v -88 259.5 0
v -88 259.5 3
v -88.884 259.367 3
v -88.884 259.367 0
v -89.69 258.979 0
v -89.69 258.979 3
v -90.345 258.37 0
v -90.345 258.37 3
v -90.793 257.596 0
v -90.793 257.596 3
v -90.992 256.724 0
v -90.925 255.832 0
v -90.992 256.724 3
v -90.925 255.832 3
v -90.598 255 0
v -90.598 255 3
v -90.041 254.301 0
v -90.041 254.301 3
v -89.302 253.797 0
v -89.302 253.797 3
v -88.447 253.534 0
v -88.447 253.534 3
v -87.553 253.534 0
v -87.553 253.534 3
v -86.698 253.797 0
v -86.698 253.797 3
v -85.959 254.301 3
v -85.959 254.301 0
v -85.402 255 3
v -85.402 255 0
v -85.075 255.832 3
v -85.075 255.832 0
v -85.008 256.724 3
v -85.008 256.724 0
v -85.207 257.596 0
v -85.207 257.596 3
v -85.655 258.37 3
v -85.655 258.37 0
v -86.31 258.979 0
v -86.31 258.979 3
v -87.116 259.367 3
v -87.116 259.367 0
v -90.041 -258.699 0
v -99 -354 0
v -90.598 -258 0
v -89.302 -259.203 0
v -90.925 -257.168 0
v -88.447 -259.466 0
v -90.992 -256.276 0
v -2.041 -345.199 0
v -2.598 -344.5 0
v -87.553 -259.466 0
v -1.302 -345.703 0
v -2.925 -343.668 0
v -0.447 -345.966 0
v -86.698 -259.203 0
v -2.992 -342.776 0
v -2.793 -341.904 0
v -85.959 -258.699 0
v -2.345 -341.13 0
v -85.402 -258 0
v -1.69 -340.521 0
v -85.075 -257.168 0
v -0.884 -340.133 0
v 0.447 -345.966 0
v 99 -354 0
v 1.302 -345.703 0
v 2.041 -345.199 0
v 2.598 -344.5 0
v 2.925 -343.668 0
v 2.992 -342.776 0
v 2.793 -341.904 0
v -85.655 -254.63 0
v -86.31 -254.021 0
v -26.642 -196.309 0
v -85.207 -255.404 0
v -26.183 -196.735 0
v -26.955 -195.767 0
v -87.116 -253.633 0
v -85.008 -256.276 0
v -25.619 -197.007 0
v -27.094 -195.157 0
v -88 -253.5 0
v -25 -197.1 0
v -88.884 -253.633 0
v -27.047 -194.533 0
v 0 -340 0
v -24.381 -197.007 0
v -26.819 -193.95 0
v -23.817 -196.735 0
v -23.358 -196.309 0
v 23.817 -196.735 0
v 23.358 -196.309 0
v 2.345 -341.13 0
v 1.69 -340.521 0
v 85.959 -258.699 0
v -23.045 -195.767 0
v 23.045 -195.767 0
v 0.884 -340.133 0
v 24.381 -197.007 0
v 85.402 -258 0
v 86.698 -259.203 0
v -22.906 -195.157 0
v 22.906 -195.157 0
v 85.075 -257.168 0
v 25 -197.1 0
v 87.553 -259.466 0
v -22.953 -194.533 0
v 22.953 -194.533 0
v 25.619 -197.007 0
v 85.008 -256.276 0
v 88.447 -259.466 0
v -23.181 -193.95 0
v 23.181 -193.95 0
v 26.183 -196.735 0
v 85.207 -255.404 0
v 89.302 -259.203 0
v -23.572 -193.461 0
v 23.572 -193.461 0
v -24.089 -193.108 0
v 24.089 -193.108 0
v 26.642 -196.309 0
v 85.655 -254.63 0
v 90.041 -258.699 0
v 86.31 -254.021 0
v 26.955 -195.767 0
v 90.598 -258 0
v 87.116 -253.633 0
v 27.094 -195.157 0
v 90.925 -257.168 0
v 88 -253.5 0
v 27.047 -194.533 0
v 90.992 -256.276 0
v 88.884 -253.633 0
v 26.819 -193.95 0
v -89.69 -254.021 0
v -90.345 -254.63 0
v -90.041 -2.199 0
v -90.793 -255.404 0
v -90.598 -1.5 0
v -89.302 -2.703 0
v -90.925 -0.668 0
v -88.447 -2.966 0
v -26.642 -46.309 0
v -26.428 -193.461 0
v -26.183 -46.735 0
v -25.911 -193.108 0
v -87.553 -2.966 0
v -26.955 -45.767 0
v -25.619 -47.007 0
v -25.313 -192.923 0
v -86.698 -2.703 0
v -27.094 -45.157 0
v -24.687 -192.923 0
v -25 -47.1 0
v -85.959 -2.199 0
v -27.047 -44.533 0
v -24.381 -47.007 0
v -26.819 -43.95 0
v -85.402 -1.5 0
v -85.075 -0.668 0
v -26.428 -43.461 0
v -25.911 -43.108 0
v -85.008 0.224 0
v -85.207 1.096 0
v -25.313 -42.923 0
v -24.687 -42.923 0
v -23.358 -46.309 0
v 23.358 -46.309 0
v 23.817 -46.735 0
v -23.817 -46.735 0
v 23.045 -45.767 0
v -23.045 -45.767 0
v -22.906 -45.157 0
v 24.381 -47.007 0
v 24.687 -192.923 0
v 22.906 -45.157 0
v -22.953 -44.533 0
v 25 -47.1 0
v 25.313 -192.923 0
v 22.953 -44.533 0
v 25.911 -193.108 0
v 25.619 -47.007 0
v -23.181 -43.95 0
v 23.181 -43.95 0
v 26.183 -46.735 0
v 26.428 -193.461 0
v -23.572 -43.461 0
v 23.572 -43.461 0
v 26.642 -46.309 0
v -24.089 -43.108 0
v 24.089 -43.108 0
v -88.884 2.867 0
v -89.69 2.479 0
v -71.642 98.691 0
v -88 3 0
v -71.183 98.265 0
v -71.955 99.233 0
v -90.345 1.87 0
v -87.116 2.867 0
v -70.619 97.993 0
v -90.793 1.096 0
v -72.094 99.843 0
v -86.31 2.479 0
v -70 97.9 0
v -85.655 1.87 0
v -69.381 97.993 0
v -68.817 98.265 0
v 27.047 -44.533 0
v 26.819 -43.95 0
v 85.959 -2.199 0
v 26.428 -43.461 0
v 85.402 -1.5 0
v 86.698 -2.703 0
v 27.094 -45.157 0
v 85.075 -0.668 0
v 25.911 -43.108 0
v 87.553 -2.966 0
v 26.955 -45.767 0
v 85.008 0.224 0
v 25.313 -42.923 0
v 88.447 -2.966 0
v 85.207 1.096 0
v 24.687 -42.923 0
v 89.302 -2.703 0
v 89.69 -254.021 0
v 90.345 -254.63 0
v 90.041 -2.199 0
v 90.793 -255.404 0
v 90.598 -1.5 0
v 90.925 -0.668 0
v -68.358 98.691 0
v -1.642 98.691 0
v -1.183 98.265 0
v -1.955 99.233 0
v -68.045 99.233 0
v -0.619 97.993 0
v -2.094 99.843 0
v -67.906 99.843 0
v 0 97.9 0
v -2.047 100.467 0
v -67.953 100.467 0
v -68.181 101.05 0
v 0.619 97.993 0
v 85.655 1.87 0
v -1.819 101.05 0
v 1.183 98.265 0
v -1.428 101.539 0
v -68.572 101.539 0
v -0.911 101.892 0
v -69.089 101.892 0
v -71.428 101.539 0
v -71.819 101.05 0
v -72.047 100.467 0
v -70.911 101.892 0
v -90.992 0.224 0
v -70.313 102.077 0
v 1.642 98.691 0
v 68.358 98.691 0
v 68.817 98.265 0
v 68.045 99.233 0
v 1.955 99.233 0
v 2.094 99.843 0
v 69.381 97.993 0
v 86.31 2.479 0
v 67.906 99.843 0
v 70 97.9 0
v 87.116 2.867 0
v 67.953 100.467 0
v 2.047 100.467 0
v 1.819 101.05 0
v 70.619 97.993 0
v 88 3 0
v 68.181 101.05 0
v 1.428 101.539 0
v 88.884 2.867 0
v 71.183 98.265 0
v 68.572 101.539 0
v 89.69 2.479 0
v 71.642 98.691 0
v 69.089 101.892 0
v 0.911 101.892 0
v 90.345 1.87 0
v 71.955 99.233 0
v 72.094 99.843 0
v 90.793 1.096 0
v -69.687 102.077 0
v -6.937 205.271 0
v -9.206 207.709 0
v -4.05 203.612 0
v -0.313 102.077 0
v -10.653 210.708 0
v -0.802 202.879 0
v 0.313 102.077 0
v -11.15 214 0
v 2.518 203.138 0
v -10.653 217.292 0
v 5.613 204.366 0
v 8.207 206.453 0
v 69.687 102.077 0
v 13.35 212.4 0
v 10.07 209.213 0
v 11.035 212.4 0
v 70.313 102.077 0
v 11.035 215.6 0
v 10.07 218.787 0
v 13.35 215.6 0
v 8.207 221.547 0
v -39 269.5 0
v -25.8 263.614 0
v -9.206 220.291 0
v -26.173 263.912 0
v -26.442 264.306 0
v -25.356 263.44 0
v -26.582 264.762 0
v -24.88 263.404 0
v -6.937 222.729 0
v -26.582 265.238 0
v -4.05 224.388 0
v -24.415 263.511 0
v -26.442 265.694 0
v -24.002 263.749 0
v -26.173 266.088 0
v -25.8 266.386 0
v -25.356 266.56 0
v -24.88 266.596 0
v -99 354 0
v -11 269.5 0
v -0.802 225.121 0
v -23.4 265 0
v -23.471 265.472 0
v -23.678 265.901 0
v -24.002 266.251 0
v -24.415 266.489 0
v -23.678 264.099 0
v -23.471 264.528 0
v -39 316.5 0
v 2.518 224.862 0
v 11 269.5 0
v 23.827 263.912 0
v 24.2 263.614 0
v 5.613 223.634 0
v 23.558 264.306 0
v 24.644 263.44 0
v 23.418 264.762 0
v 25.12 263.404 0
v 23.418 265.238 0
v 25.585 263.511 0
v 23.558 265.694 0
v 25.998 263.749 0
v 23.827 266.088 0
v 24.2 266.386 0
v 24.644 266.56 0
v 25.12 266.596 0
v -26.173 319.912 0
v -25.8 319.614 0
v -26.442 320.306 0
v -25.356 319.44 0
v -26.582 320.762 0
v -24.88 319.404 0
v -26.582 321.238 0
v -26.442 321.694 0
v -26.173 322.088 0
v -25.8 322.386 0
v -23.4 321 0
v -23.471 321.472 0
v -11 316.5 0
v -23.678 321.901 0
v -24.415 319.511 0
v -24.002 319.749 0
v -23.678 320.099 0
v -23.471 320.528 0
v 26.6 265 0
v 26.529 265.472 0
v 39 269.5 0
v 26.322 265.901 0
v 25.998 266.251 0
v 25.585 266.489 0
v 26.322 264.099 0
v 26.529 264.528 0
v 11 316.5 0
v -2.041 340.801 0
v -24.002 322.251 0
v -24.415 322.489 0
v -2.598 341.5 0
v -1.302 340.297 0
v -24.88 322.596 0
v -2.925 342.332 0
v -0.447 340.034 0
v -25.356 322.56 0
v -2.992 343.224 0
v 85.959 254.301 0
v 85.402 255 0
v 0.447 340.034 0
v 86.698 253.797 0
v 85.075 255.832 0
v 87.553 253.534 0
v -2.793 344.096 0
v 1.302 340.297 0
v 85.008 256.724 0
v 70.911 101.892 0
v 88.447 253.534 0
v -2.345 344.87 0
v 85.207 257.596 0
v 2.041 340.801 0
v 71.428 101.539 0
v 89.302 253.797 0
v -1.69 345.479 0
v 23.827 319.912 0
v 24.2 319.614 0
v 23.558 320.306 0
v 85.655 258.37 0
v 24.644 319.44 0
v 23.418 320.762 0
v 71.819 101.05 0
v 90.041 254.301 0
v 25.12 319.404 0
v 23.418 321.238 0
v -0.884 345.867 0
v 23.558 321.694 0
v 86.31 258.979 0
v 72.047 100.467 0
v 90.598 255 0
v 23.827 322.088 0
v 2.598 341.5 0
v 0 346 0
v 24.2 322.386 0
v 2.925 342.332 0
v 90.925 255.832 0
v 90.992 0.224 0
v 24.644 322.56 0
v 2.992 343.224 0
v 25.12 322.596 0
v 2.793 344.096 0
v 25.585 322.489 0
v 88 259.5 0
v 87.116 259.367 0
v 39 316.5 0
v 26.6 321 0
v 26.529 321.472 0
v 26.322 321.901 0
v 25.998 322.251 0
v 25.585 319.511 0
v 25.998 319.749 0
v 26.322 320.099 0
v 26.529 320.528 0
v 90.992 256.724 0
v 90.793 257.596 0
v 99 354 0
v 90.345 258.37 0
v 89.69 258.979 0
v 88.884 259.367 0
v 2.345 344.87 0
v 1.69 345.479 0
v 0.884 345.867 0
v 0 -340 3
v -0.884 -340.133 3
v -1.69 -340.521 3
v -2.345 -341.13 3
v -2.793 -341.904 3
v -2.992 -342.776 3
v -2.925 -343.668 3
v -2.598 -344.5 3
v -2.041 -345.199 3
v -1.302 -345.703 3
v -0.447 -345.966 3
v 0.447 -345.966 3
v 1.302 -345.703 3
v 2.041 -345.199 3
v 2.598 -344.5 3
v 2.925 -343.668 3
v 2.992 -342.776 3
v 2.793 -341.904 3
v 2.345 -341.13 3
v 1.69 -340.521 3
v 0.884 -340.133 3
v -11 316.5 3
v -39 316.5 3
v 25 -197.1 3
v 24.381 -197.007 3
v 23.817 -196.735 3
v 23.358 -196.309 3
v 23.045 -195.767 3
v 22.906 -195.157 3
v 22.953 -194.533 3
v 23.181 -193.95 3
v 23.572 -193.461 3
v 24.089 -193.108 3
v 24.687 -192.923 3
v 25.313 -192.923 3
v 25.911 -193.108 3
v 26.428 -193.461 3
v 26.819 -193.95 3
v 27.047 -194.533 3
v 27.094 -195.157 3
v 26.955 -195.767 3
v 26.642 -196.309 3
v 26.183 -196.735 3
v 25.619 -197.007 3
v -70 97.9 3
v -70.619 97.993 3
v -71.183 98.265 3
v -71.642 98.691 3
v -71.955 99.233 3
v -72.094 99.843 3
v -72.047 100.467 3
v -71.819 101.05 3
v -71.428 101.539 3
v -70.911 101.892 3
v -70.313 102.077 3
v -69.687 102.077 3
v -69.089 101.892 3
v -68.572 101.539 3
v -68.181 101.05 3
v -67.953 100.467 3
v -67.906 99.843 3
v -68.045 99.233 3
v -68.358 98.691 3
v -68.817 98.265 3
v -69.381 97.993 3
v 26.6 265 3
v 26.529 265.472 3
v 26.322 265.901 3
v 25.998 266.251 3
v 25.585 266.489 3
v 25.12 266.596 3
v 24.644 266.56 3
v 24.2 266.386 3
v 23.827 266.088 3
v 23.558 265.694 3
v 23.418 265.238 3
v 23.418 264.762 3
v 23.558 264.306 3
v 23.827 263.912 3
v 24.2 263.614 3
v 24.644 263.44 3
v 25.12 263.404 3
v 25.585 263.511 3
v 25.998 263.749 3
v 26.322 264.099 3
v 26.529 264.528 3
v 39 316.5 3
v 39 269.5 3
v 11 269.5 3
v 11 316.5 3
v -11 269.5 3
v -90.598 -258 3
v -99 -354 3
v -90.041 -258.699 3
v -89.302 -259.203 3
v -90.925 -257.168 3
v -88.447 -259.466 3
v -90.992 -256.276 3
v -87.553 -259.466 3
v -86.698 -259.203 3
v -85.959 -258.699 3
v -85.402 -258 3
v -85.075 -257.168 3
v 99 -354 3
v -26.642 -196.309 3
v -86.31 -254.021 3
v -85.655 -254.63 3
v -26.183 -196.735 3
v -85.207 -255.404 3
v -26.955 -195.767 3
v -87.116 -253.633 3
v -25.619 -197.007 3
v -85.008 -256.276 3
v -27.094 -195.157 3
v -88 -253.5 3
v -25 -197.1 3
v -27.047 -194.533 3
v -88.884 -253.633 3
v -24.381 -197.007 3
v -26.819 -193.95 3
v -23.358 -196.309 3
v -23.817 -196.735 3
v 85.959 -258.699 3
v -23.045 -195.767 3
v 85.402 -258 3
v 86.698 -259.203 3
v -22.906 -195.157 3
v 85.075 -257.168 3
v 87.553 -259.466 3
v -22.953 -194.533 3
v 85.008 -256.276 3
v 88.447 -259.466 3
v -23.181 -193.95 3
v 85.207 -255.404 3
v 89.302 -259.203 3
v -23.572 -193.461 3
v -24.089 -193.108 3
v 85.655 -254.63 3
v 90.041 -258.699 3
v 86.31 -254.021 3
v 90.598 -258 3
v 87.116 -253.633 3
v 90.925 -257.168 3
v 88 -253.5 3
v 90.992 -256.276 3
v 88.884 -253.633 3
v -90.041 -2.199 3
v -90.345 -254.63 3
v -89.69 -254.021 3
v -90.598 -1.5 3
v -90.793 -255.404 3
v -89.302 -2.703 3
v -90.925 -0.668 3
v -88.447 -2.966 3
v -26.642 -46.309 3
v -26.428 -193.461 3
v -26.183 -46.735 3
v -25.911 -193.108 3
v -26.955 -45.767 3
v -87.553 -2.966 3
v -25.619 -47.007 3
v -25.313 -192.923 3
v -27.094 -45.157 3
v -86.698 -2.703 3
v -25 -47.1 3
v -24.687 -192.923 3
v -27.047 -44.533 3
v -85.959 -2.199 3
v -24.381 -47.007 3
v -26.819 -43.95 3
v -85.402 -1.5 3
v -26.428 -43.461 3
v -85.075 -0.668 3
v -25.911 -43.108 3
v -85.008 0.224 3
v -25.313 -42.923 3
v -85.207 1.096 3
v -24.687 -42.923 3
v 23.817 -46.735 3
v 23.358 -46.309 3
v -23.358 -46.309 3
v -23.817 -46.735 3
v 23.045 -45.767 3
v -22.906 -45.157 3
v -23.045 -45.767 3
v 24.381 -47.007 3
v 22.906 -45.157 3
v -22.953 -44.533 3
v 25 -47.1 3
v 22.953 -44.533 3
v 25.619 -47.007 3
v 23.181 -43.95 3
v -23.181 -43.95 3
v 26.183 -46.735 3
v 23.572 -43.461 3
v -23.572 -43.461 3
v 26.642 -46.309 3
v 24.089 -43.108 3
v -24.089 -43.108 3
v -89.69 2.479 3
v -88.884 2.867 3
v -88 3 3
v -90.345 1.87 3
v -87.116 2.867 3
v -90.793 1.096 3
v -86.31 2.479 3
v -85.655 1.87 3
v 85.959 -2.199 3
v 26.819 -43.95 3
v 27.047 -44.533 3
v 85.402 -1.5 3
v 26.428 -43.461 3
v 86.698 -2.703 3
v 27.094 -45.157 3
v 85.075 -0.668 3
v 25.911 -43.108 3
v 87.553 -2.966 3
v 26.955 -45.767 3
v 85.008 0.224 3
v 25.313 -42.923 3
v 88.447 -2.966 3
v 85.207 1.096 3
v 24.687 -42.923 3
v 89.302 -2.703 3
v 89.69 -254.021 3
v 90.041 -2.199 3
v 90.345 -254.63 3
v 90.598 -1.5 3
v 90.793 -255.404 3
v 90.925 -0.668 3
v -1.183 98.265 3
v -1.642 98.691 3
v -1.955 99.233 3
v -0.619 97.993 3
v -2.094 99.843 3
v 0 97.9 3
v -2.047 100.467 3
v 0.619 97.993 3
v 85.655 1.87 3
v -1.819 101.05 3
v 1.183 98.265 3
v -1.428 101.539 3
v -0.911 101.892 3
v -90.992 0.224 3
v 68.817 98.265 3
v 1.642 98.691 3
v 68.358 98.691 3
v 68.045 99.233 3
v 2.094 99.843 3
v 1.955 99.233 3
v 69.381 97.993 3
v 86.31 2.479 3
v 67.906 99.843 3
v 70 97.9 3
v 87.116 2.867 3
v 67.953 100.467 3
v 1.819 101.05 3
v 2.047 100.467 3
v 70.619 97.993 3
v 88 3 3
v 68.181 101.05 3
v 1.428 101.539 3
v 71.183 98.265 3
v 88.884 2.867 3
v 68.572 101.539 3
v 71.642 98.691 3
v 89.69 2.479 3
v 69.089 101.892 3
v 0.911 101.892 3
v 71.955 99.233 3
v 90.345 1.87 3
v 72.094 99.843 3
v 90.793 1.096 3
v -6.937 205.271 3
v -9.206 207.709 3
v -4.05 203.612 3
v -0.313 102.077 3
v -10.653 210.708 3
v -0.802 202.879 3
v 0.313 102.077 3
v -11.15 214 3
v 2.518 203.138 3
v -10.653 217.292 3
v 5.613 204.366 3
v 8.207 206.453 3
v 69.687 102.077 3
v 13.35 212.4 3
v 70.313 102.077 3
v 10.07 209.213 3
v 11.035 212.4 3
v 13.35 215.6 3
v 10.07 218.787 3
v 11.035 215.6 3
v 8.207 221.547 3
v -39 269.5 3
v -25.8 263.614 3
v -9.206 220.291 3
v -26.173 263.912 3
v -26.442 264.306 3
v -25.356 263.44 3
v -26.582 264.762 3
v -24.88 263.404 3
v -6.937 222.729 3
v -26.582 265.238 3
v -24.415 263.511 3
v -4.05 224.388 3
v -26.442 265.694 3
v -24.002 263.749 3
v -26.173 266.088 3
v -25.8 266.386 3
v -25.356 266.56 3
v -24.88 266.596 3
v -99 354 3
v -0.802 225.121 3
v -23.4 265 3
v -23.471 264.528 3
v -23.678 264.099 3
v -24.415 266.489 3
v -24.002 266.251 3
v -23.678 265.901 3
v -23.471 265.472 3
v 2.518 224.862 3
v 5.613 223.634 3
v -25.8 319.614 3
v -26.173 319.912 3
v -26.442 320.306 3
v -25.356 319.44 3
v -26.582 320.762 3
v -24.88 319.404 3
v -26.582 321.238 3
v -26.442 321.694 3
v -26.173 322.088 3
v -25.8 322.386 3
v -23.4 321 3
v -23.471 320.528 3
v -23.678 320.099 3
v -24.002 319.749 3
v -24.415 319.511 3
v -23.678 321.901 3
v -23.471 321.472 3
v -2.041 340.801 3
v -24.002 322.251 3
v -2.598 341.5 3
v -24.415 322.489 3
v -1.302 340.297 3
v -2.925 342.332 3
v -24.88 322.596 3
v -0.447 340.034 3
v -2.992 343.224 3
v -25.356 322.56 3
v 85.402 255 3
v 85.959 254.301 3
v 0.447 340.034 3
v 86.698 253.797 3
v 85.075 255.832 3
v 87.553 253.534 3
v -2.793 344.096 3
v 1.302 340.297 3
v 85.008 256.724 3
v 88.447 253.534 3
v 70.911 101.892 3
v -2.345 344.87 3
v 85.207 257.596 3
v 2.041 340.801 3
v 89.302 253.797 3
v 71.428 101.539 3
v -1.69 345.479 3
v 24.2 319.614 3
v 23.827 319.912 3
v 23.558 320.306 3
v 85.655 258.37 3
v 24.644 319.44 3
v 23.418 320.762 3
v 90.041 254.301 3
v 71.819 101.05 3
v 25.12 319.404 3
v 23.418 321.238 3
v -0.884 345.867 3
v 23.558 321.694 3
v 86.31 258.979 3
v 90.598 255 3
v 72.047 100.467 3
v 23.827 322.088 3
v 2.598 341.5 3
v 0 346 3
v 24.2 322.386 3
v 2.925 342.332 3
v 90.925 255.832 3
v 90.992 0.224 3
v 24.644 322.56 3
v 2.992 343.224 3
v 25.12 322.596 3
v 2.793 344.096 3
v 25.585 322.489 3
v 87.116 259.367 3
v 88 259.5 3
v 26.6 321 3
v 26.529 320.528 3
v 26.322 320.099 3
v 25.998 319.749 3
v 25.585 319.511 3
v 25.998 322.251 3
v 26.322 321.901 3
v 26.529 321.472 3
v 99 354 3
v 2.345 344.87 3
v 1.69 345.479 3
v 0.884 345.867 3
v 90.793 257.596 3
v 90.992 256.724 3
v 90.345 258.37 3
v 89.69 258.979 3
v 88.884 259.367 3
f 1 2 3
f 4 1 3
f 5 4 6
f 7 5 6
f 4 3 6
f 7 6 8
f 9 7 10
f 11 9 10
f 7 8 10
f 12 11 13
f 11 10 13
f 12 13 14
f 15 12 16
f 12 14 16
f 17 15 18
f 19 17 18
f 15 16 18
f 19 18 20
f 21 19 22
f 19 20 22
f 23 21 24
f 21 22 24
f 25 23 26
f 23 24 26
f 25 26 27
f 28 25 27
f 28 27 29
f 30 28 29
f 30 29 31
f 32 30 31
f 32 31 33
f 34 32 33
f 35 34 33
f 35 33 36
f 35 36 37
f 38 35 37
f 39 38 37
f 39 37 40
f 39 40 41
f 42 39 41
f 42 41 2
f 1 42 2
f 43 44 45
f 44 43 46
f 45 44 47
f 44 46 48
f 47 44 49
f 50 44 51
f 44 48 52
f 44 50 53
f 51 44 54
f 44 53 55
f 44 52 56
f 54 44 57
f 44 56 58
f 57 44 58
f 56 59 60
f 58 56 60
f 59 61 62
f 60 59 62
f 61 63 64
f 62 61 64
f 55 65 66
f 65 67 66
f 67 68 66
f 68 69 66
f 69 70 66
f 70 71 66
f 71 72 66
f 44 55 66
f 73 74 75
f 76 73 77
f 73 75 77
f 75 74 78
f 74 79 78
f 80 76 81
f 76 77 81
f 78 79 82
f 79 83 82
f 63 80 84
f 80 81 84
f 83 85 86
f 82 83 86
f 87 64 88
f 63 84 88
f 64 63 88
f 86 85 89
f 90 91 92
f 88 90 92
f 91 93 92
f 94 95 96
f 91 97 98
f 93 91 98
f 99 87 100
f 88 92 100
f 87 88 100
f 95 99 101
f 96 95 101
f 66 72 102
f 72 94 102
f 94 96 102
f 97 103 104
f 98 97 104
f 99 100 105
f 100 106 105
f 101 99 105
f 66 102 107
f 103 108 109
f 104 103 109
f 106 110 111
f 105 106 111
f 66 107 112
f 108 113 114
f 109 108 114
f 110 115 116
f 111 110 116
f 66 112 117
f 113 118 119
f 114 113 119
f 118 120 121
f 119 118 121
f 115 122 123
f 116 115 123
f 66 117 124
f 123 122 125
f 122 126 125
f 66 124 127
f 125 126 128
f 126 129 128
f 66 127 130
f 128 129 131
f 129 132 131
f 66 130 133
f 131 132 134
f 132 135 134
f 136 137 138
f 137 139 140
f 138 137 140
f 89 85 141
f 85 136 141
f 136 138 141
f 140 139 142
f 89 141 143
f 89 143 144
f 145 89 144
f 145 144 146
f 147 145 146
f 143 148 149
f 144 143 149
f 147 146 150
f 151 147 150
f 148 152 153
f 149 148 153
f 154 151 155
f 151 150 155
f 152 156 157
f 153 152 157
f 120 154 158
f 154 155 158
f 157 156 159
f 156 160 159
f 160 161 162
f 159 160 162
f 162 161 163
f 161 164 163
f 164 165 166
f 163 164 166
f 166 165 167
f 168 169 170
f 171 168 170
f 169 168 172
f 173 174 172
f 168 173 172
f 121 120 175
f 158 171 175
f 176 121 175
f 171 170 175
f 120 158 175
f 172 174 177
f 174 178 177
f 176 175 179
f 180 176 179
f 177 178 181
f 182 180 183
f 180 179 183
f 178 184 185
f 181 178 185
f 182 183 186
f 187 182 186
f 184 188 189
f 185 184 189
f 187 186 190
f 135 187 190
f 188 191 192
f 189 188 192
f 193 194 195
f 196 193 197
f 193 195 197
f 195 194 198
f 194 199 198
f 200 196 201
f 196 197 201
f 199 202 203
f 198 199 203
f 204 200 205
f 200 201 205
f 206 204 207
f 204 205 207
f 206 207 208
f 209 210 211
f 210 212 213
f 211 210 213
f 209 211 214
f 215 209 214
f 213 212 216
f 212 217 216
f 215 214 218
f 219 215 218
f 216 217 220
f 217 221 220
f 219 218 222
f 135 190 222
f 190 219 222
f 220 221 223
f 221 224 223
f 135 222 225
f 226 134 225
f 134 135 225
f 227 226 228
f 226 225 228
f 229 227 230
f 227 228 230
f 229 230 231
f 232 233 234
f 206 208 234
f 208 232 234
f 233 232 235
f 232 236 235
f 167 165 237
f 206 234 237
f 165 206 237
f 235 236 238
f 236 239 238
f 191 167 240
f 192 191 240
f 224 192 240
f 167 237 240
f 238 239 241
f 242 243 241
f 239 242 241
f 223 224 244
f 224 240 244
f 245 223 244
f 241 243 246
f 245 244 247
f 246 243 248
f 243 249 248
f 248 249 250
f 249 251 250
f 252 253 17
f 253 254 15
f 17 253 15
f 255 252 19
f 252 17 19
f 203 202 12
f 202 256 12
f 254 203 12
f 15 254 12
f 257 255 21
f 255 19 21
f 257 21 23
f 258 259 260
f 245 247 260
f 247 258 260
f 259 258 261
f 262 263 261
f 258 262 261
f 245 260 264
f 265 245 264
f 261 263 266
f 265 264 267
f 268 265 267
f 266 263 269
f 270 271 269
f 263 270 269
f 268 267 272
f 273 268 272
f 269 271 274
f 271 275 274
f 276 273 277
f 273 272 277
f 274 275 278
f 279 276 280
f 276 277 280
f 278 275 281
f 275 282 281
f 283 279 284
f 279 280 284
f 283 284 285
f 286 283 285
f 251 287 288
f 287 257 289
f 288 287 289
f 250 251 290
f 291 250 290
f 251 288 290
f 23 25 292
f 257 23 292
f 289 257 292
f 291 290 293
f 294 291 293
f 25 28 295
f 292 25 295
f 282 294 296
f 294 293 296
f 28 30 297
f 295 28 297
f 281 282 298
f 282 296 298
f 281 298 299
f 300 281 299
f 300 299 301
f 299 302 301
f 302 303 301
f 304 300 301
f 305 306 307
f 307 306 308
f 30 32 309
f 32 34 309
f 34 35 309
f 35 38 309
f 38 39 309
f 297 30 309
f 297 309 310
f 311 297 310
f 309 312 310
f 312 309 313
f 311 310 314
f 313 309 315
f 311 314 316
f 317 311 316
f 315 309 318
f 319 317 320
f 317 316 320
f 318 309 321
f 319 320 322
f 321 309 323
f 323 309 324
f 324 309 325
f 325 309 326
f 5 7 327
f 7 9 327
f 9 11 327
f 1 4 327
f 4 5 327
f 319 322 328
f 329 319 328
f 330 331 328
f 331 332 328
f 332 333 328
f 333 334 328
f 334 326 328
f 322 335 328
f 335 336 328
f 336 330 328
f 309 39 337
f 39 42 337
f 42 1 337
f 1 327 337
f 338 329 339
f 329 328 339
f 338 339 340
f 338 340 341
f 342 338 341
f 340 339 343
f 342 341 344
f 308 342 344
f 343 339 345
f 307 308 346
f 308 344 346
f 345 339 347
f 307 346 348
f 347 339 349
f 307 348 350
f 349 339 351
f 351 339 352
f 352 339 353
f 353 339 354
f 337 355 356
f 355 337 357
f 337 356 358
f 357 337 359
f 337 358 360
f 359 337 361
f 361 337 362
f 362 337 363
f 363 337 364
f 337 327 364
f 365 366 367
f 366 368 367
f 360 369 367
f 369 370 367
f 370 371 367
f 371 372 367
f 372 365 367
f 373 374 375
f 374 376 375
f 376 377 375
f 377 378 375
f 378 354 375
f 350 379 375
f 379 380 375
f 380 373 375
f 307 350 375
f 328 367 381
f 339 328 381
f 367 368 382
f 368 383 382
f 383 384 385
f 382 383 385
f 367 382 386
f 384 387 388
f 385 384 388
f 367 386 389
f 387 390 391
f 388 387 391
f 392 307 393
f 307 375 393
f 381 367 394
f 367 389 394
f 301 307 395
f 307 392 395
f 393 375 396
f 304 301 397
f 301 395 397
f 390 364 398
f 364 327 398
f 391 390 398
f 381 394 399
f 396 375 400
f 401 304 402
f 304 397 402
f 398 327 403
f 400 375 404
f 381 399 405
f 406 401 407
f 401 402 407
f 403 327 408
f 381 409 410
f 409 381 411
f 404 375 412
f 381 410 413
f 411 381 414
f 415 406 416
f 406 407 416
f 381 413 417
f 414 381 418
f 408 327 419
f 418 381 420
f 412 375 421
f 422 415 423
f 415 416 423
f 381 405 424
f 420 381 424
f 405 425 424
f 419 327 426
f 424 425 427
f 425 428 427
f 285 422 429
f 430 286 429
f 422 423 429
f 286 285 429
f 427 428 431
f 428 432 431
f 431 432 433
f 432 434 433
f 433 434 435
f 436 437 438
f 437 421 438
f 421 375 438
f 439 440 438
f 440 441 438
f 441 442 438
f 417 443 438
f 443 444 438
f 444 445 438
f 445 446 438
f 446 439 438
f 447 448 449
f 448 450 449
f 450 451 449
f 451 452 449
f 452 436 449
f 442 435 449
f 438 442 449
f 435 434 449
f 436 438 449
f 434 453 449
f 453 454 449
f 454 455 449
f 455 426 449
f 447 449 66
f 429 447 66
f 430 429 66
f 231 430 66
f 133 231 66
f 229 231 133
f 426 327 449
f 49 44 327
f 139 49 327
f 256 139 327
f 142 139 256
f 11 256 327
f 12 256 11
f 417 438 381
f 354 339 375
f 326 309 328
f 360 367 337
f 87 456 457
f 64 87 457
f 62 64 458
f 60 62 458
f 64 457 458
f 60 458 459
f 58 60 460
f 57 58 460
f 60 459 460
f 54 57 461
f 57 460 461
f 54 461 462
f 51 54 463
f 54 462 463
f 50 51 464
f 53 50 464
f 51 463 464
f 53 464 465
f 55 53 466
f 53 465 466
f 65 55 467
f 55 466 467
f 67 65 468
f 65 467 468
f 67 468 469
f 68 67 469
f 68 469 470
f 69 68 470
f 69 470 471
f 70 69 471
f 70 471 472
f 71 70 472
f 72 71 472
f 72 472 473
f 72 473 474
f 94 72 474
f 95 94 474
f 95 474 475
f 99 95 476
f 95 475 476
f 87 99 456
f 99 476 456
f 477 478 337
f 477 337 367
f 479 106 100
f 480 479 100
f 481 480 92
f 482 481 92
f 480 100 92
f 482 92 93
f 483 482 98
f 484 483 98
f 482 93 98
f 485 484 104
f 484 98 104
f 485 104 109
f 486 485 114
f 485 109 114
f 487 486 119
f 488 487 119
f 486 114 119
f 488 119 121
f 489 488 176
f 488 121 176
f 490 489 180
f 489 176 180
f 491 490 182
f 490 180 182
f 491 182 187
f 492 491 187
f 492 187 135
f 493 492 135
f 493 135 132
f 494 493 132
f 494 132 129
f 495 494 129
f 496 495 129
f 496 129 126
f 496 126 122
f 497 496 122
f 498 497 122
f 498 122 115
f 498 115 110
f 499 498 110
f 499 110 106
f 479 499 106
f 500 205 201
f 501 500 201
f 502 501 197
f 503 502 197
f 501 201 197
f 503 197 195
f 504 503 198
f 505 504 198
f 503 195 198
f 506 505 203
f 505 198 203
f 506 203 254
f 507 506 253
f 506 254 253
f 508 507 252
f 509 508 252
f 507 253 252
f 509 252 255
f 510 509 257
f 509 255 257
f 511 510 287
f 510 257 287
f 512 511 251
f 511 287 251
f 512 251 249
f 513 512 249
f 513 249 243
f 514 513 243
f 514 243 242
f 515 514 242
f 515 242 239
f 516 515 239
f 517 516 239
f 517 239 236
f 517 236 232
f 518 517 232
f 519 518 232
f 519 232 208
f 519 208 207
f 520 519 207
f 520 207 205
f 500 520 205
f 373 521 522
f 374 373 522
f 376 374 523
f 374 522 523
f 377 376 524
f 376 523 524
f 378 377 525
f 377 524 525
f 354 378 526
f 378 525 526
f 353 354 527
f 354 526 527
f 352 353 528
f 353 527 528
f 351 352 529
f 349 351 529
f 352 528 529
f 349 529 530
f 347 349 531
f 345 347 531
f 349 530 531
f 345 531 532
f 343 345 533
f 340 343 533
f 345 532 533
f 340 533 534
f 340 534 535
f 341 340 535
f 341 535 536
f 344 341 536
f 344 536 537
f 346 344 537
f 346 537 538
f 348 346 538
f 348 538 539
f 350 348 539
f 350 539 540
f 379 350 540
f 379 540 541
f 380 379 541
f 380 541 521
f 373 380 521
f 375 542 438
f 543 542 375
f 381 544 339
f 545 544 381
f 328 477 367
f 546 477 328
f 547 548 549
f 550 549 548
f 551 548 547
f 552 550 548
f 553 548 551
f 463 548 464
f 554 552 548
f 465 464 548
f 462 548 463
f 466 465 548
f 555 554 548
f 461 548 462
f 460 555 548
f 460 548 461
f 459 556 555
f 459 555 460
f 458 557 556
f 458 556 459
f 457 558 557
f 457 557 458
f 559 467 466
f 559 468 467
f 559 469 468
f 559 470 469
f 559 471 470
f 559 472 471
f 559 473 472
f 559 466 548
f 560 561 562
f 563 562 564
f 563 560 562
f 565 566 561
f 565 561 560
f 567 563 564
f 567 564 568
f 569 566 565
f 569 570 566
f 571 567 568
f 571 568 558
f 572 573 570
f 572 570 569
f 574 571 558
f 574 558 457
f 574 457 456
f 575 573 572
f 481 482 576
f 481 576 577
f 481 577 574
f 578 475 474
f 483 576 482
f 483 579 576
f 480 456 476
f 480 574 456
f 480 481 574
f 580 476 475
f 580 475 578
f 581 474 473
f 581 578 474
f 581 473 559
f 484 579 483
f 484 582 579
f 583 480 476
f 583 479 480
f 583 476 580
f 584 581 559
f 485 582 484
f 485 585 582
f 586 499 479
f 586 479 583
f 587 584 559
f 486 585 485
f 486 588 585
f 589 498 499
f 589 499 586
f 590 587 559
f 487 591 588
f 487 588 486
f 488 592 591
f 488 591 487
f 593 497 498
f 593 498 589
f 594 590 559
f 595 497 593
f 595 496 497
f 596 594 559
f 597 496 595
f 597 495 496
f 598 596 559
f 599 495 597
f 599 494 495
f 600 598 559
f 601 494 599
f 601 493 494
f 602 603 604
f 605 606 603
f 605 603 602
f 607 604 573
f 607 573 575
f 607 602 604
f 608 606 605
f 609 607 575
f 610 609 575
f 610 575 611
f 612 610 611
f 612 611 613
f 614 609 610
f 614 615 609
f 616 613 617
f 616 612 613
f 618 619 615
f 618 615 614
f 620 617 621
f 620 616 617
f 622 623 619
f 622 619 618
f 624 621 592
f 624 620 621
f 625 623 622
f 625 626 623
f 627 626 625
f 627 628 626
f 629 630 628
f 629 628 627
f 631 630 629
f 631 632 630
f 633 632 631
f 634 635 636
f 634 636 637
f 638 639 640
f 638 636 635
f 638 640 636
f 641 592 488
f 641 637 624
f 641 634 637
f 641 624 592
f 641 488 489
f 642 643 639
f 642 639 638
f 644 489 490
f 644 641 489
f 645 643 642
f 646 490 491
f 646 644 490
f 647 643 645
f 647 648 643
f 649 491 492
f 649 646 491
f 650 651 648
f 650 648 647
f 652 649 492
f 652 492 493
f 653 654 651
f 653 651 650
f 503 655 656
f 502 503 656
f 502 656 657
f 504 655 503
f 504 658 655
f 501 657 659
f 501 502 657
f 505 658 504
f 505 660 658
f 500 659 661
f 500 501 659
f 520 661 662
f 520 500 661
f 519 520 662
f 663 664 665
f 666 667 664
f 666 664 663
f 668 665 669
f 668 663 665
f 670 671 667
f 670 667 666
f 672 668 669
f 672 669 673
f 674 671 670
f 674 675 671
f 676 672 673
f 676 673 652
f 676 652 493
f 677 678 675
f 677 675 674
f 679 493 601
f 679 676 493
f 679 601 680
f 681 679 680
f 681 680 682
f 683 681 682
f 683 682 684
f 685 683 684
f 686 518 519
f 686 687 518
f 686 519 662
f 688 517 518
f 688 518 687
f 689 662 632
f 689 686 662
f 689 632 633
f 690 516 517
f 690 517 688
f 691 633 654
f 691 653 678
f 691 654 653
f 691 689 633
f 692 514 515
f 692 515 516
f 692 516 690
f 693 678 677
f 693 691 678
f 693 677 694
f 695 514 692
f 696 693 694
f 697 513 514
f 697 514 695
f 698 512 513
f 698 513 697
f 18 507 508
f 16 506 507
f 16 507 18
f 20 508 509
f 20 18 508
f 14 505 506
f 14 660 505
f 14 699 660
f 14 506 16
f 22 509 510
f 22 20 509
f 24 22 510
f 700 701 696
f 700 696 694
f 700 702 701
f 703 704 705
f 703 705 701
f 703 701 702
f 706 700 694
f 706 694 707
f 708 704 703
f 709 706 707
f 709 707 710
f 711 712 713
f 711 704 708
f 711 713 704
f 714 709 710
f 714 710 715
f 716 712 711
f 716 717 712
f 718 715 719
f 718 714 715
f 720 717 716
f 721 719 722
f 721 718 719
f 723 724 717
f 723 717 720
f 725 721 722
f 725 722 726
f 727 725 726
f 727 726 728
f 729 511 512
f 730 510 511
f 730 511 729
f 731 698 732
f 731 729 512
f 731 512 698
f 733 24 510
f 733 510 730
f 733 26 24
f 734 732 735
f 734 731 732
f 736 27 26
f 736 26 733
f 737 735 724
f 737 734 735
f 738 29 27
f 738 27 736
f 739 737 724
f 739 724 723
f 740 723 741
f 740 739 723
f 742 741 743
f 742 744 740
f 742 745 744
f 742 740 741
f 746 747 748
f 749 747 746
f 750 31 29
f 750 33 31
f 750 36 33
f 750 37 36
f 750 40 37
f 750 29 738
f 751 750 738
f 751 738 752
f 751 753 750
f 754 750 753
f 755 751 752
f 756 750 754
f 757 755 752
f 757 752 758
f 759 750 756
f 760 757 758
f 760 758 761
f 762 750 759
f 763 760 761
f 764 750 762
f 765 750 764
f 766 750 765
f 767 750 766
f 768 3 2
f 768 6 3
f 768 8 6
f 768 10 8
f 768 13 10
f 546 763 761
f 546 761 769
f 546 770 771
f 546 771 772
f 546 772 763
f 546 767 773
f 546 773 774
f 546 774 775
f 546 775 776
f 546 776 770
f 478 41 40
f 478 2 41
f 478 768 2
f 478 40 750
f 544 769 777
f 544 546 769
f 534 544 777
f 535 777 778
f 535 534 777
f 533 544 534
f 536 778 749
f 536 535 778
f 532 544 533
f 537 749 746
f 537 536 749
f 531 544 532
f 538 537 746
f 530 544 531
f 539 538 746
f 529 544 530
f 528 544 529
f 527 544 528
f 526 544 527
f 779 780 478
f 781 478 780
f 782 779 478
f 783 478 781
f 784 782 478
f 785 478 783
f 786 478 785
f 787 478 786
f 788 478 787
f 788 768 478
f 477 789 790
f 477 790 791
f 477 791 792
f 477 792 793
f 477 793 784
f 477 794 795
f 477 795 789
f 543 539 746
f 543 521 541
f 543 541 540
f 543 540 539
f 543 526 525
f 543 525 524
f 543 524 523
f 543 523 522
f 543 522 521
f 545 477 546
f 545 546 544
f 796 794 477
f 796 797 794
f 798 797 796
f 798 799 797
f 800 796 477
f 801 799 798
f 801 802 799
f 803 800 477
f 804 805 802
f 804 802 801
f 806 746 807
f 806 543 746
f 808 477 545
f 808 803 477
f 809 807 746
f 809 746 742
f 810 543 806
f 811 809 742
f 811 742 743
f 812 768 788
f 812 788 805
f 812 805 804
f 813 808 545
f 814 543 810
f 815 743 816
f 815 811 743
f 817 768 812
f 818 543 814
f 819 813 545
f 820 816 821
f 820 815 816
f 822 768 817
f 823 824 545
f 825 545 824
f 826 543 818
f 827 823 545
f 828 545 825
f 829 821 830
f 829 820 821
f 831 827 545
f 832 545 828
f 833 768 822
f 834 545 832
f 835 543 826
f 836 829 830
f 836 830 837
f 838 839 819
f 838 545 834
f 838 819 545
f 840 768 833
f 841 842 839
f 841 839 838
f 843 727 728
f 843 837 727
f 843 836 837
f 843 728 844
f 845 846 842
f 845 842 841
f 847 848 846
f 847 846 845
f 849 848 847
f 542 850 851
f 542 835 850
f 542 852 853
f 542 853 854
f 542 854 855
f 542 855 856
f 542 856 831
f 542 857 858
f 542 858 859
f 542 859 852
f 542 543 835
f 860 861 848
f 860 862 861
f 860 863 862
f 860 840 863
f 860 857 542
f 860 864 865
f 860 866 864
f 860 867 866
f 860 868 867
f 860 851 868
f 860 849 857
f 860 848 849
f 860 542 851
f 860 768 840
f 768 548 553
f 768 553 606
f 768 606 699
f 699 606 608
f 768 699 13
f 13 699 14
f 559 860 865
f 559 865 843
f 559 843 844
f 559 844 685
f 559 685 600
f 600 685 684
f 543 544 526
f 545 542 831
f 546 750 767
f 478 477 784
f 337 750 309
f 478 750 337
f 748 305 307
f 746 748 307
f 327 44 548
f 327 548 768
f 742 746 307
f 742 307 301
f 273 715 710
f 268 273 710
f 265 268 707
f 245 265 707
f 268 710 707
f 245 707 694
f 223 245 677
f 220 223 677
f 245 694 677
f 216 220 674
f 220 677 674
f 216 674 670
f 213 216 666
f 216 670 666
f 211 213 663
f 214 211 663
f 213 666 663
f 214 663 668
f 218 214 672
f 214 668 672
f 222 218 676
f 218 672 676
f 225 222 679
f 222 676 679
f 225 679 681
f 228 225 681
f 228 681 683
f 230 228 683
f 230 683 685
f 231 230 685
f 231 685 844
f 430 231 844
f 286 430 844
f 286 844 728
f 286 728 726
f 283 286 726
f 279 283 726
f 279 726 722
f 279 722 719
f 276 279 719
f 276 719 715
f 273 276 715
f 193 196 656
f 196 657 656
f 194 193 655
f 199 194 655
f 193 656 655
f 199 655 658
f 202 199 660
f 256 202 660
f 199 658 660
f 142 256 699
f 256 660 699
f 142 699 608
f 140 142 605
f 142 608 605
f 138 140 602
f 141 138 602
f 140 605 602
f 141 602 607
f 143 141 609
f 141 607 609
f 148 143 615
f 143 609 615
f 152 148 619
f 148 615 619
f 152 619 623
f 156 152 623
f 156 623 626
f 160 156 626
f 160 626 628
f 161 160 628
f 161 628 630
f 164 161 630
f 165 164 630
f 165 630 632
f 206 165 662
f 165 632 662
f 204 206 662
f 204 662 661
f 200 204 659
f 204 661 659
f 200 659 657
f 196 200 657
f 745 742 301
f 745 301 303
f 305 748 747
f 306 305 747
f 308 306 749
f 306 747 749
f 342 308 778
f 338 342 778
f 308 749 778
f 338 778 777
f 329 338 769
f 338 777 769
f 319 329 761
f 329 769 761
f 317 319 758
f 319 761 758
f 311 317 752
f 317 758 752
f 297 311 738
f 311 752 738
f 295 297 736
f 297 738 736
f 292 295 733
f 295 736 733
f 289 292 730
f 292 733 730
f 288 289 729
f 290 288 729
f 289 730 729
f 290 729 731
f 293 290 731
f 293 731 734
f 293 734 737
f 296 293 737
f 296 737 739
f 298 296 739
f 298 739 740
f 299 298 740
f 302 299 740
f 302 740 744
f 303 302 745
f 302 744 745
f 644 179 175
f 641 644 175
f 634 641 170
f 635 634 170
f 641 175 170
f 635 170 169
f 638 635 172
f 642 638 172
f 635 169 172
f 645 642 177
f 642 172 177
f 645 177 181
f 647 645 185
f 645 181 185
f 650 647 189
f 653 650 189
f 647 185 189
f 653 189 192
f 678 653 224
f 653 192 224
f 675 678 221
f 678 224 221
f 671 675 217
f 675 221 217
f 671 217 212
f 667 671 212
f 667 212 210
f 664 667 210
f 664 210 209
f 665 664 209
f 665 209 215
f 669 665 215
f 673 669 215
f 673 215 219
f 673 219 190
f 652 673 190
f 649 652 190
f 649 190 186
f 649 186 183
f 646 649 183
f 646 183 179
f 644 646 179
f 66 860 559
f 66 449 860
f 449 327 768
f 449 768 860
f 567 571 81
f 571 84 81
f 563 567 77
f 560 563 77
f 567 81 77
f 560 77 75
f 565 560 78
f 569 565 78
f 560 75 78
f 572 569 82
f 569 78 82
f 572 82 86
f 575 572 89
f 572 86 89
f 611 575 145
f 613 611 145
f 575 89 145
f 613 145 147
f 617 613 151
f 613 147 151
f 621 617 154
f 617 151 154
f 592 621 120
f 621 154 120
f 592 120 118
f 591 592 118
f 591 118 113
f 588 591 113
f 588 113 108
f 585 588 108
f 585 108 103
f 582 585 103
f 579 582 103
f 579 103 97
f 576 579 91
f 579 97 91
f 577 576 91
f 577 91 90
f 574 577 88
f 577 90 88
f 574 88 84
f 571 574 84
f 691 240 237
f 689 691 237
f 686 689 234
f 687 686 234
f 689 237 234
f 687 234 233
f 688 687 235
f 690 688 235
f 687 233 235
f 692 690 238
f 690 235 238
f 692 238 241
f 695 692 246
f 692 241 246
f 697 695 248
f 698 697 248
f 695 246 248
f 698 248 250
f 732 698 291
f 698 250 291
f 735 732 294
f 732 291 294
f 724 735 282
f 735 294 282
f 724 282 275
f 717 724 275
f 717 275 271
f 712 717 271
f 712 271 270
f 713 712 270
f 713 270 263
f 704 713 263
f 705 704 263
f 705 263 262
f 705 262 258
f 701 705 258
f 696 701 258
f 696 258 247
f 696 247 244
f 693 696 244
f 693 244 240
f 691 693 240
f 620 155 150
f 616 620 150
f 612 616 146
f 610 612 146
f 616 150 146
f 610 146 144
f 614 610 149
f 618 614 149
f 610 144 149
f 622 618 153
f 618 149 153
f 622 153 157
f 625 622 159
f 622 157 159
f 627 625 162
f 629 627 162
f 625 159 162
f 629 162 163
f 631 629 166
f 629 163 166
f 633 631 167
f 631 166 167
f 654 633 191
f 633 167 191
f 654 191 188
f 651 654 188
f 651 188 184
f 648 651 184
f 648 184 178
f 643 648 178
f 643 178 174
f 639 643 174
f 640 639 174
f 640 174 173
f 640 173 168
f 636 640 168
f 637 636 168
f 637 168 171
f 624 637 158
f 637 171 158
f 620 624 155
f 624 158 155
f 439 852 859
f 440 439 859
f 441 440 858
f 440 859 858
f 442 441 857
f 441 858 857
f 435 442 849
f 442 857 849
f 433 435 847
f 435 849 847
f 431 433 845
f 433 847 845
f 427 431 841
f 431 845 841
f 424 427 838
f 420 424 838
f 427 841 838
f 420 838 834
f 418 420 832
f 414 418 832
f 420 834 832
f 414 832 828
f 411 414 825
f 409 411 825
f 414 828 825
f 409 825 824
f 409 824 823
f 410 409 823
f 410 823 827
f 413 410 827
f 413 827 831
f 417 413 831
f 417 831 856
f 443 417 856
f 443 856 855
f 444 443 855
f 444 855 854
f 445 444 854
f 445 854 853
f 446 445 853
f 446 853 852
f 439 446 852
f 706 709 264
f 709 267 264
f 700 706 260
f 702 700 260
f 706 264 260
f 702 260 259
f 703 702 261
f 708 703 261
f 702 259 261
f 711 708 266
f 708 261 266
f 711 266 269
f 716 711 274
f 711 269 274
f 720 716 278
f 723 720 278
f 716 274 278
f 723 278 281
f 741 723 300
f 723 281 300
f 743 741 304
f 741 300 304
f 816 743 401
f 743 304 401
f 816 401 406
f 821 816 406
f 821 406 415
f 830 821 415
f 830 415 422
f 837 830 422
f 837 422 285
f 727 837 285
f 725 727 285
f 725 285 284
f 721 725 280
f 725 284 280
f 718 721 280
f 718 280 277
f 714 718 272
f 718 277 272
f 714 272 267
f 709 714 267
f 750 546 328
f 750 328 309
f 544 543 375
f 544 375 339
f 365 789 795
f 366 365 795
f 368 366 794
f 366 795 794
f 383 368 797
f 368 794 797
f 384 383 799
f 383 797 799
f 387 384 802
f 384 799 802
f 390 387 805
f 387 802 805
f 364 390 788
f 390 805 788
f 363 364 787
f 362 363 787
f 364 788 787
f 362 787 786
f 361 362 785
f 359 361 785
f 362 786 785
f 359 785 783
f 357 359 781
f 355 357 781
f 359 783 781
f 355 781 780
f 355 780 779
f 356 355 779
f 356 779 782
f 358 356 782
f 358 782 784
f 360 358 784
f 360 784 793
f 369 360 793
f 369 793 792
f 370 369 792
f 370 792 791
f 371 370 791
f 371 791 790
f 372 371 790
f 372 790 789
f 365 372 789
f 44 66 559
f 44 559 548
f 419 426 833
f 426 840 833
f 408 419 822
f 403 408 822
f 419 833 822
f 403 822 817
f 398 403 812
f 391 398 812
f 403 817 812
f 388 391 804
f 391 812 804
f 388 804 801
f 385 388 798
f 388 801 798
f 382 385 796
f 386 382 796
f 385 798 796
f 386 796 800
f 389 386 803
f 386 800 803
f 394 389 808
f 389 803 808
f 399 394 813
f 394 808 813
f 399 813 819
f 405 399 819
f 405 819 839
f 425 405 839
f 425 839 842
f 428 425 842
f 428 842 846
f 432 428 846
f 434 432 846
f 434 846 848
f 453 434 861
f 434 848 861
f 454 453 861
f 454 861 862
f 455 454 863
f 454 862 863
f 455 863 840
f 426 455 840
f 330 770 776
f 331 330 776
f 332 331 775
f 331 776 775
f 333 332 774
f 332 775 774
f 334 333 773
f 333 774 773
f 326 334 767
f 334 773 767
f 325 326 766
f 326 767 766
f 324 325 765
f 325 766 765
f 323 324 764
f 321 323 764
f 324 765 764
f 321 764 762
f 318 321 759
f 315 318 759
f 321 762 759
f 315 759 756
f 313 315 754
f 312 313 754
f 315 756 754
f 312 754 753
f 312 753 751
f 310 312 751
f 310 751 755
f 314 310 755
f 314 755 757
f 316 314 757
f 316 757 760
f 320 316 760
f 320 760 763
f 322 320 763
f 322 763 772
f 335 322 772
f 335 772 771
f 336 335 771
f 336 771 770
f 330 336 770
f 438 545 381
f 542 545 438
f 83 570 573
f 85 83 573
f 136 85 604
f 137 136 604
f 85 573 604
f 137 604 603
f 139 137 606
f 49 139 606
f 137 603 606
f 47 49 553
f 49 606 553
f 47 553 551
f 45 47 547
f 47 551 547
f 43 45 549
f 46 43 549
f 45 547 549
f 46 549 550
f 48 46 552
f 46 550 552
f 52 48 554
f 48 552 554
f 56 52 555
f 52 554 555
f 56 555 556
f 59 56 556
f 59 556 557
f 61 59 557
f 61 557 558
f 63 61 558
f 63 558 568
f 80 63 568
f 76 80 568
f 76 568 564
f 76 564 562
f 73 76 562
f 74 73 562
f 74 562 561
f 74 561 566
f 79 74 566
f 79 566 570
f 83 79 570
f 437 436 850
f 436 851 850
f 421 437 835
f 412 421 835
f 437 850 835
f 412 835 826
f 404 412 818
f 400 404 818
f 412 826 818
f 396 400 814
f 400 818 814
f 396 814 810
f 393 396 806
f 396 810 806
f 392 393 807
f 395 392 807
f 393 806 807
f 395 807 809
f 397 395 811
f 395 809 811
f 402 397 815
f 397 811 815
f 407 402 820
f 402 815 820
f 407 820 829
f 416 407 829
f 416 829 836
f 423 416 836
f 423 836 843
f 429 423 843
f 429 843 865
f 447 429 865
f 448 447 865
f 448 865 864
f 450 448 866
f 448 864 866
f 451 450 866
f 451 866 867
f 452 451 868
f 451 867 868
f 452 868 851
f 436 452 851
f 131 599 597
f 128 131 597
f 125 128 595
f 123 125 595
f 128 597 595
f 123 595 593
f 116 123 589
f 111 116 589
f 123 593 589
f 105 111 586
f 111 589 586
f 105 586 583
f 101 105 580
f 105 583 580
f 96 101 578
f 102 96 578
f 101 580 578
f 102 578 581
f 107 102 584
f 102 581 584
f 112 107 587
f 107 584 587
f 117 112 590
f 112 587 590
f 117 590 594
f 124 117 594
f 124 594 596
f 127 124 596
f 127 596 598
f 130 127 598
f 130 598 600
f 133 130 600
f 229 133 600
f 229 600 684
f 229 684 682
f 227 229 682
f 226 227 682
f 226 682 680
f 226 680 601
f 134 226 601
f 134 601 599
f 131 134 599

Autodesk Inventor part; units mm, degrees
ref_plane "YZ Plane" through (0, 0, 0) normal (1, 0, 0) x (0, 1, 0)
ref_plane "XZ Plane" through (0, 0, 0) normal (0, 1, 0) x (-1, 0, 0)
ref_plane "XY Plane" through (0, 0, 0) normal (0, 0, 1) x (1, 0, 0)
sketch "スケッチ1" plane through (0, 0, 0) normal (0, 0, 1) x (1, 0, 0)
  line L0 (99, -354) -> (-99, -354)
  line L1 (-99, -354) -> (-99, 354)
  line L2 (-99, 354) -> (99, 354)
  line L3 (99, 354) -> (99, -354)
  line L4 (99, -354) -> (-99, 354) construction
  line L5 (-99, -354) -> (99, 354) construction
  point P0 (0, 0)
  dimension "d0" = 198
  dimension "d1" = 708
extrude "押し出し1" add sketch "スケッチ1" along normal blind 3
sketch "スケッチ4" plane through (0, 0, 0) normal (0, 0, -1) x (-1, 0, 0)
  line L0 (99, -354) -> (-99, -354) projected
  line L1 (99, 354) -> (99, -354) projected
  line L2 (-99, 354) -> (99, 354) projected
  line L3 (-99, -354) -> (-99, 354) projected
  line L4 (-88, 343) -> (88, 343)
  line L5 (88, 343) -> (88, -343)
  line L6 (88, -343) -> (-88, -343)
  line L7 (-88, -343) -> (-88, 343)
  line L8 (-88, -256.5) -> (88, -256.5)
  line L9 (88, -256.5) -> (88, 256.5)
  line L10 (88, 256.5) -> (-88, 256.5)
  line L11 (-88, 256.5) -> (-88, -256.5)
  point P0 (0, 0)
  point P1 (0, -343)
  point P2 (0, 343)
  point P3 (-88, 0)
  point P4 (88, 0)
  dimension "d32" = 11
  dimension "d33" = 86.5
  dimension "d34" = 86.5
hole "穴3" at (0, -343, 0) at (0, 343, 0) at (88, 0, 0) at (-88, 0, 0) at (-88, -256.5, 0) at (88, -256.5, 0) at (88, 256.5, 0) at (-88, 256.5, 0) direction (0, 0, 1) diameter 6 end through all
sketch "スケッチ5" plane through (0, 0, 3) normal (0, 0, 1) x (1, 0, 0)
  circle A0 centre (88, 256.5) radius 3 projected
  circle A1 centre (-88, -256.5) radius 3 projected
  circle A2 centre (88, 0) radius 3 projected
  circle A3 centre (0, -343) radius 3 projected
  circle A4 centre (0, 343) radius 3 projected
  circle A5 centre (-88, 0) radius 3 projected
  circle A6 centre (88, -256.5) radius 3 projected
  circle A7 centre (-88, 256.5) radius 3 projected
  line L0 (-99, -354) -> (99, -354) projected
  line L1 (99, -354) -> (99, 354) projected
  line L2 (99, 354) -> (-99, 354) projected
  line L3 (-99, 354) -> (-99, -354) projected
  line L4 (-25, -45) -> (25, -45)
  line L5 (25, -45) -> (25, -195)
  line L6 (25, -195) -> (-25, -195)
  line L7 (-25, -195) -> (-25, -45)
  line L8 (-25, -45) -> (25, -195) construction
  line L9 (25, -45) -> (-25, -195) construction
  point P0 (0, 0)
  point P1 (0, -120)
  point P2 (0, -120)
  dimension "d42" = 150
  dimension "d43" = 50
  dimension "d44" = 120
hole "穴4" at (-25, -45, 3) at (25, -45, 3) at (-25, -195, 3) at (25, -195, 3) direction (0, 0, -1) diameter 4.2 end through all
sketch "スケッチ6" plane through (0, 0, 3) normal (0, 0, 1) x (1, 0, 0)
  circle A0 centre (-25, -195) radius 2.1 projected
  circle A1 centre (-25, -45) radius 2.1 projected
  circle A2 centre (25, -45) radius 2.1 projected
  circle A3 centre (25, -195) radius 2.1 projected
  circle A4 centre (88, 256.5) radius 3 projected
  circle A5 centre (-88, -256.5) radius 3 projected
  circle A6 centre (88, 0) radius 3 projected
  circle A7 centre (0, -343) radius 3 projected
  circle A8 centre (0, 343) radius 3 projected
  circle A9 centre (-88, 0) radius 3 projected
  circle A10 centre (88, -256.5) radius 3 projected
  circle A11 centre (-88, 256.5) radius 3 projected
  line L0 (-99, -354) -> (99, -354) projected
  line L1 (99, -354) -> (99, 354) projected
  line L2 (99, 354) -> (-99, 354) projected
  line L3 (-99, 354) -> (-99, -354) projected
  line L4 (11, 316.5) -> (39, 316.5)
  line L5 (39, 316.5) -> (39, 269.5)
  line L6 (39, 269.5) -> (11, 269.5)
  line L7 (11, 269.5) -> (11, 316.5)
  line L8 (11, 316.5) -> (39, 269.5) construction
  line L9 (39, 316.5) -> (11, 269.5) construction
  line L10 (-39, 316.5) -> (-11, 316.5)
  line L11 (-11, 316.5) -> (-11, 269.5)
  line L12 (-11, 269.5) -> (-39, 269.5)
  line L13 (-39, 269.5) -> (-39, 316.5)
  line L14 (-39, 316.5) -> (-11, 269.5) construction
  line L15 (-11, 316.5) -> (-39, 269.5) construction
  line L16 (25, 321) -> (-25, 321)
  line L17 (-25, 321) -> (-25, 265)
  line L18 (-25, 265) -> (25, 265)
  line L19 (25, 265) -> (25, 321)
  circle A12 centre (25, 321) radius 1.6
  circle A13 centre (25, 265) radius 1.6
  circle A14 centre (-25, 265) radius 1.6
  circle A15 centre (-25, 321) radius 1.6
  point P0 (0, 0)
  point P1 (25, 293)
  point P2 (-25, 293)
  point P3 (-25, 293)
  point P4 (25, 293)
  point P5 (-25, 293)
  point P6 (25, 293)
  point P7 (-23.4, 265)
  point P8 (-25, 266.6)
  dimension "d52" = 47
  dimension "d53" = 28
  dimension "d54" = 28
  dimension "d55" = 50
  dimension "d56" = 25
  dimension "d57" = 50
  dimension "d58" = 56
  dimension "d59" = 28
  dimension "d60" = 3.2
  dimension "d61" = 3.2
  dimension "d62" = 3.2
  dimension "d63" = 3.2
extrude "押し出し2" cut sketch "スケッチ6" against normal blind 10 contours L4 L19 L6 L7 | L4 L5 L6 L19 | A12 L16 L19 | L19 L16 A12 | A13 L18 L19 | L19 L18 A13 | A15 L17 L16 | L16 L17 A15 | A14 L17 L18 | L18 L17 A14 | L17 L12 L13 L10 | L10 L11 L12 L17
sketch "スケッチ7" plane through (0, 0, 3) normal (0, 0, 1) x (1, 0, 0)
  circle A0 centre (0, 214) radius 11.15
  line L0 (99, 354) -> (-99, 354) projected
  point P0 (0, 0)
  dimension "d66" = 22.3
  dimension "d67" = 140
extrude "押し出し3" cut sketch "スケッチ7" against normal blind 10
sketch "スケッチ8" plane through (0, 0, 3) normal (0, 0, 1) x (1, 0, 0)
  line L0 (4.8167, 215.6) -> (13.35, 215.6)
  line L1 (13.35, 215.6) -> (13.35, 212.4)
  line L2 (13.35, 212.4) -> (4.8167, 212.4)
  line L3 (4.8167, 212.4) -> (4.8167, 215.6)
  circle A0 centre (0, 214) radius 11.15 projected
  circle A1 centre (0, 214) radius 11.15 projected
  point P0 (0, 0)
  point P1 (-11.15, 214)
  point P2 (11.0346, 215.6)
  point P3 (11.0346, 212.4)
  dimension "d70" = 3.2
  dimension "d71" = 1.6
  dimension "d72" = 24.5
extrude "押し出し4" cut sketch "スケッチ8" against normal blind 10 contours L0 L1 L2 A0
sketch "スケッチ9" plane through (0, 0, 3) normal (0, 0, 1) x (1, 0, 0)
  point P0 (0, 0)
  point P1 (70, 100)
  point P2 (-70, 100)
  point P3 (0, 100)
  dimension "d75" = 140
  dimension "d76" = 70
  dimension "d77" = 100
hole "穴5" at (70, 100, 3) at (-70, 100, 3) at (0, 100, 3) direction (0, 0, -1) diameter 4.2 end through all
sketch "スケッチ10" plane through (0, 0, 3) normal (0, 0, 1) x (1, 0, 0)
  circle A0 centre (-70, 100) radius 2.1 projected
  circle A1 centre (70, 100) radius 2.1 projected
  circle A2 centre (0, 100) radius 2.1 projected
  line L0 (13.35, 212.4) -> (11.0346, 212.4) projected
  arc A3 (11.0346, 215.6) -> (11.0346, 212.4) centre (0, 214) ccw projected
  line L1 (11.0346, 215.6) -> (13.35, 215.6) projected
  line L2 (13.35, 215.6) -> (13.35, 212.4) projected
  circle A4 centre (25, 265) radius 1.6 projected
  line L3 (11, 269.5) -> (11, 316.5) projected
  line L4 (11, 316.5) -> (39, 316.5) projected
  line L5 (39, 316.5) -> (39, 269.5) projected
  line L6 (39, 269.5) -> (11, 269.5) projected
  circle A5 centre (-25, 321) radius 1.6 projected
  circle A6 centre (-25, 265) radius 1.6 projected
  circle A7 centre (25, 321) radius 1.6 projected
  line L7 (-11, 269.5) -> (-39, 269.5) projected
  line L8 (-39, 269.5) -> (-39, 316.5) projected
  line L9 (-39, 316.5) -> (-11, 316.5) projected
  line L10 (-11, 316.5) -> (-11, 269.5) projected
  circle A8 centre (-25, -195) radius 2.1 projected
  circle A9 centre (-25, -45) radius 2.1 projected
  circle A10 centre (25, -45) radius 2.1 projected
  circle A11 centre (25, -195) radius 2.1 projected
  circle A12 centre (88, 256.5) radius 3 projected
  circle A13 centre (-88, -256.5) radius 3 projected
  circle A14 centre (88, 0) radius 3 projected
  circle A15 centre (0, -343) radius 3 projected
  circle A16 centre (0, 343) radius 3 projected
  circle A17 centre (-88, 0) radius 3 projected
  circle A18 centre (88, -256.5) radius 3 projected
  circle A19 centre (-88, 256.5) radius 3 projected
  line L11 (-99, -354) -> (99, -354) projected
  line L12 (99, -354) -> (99, 354) projected
  line L13 (99, 354) -> (-99, 354) projected
  line L14 (-99, 354) -> (-99, -354) projected
  point P0 (0, 0)
properties part number "Cut_A"
